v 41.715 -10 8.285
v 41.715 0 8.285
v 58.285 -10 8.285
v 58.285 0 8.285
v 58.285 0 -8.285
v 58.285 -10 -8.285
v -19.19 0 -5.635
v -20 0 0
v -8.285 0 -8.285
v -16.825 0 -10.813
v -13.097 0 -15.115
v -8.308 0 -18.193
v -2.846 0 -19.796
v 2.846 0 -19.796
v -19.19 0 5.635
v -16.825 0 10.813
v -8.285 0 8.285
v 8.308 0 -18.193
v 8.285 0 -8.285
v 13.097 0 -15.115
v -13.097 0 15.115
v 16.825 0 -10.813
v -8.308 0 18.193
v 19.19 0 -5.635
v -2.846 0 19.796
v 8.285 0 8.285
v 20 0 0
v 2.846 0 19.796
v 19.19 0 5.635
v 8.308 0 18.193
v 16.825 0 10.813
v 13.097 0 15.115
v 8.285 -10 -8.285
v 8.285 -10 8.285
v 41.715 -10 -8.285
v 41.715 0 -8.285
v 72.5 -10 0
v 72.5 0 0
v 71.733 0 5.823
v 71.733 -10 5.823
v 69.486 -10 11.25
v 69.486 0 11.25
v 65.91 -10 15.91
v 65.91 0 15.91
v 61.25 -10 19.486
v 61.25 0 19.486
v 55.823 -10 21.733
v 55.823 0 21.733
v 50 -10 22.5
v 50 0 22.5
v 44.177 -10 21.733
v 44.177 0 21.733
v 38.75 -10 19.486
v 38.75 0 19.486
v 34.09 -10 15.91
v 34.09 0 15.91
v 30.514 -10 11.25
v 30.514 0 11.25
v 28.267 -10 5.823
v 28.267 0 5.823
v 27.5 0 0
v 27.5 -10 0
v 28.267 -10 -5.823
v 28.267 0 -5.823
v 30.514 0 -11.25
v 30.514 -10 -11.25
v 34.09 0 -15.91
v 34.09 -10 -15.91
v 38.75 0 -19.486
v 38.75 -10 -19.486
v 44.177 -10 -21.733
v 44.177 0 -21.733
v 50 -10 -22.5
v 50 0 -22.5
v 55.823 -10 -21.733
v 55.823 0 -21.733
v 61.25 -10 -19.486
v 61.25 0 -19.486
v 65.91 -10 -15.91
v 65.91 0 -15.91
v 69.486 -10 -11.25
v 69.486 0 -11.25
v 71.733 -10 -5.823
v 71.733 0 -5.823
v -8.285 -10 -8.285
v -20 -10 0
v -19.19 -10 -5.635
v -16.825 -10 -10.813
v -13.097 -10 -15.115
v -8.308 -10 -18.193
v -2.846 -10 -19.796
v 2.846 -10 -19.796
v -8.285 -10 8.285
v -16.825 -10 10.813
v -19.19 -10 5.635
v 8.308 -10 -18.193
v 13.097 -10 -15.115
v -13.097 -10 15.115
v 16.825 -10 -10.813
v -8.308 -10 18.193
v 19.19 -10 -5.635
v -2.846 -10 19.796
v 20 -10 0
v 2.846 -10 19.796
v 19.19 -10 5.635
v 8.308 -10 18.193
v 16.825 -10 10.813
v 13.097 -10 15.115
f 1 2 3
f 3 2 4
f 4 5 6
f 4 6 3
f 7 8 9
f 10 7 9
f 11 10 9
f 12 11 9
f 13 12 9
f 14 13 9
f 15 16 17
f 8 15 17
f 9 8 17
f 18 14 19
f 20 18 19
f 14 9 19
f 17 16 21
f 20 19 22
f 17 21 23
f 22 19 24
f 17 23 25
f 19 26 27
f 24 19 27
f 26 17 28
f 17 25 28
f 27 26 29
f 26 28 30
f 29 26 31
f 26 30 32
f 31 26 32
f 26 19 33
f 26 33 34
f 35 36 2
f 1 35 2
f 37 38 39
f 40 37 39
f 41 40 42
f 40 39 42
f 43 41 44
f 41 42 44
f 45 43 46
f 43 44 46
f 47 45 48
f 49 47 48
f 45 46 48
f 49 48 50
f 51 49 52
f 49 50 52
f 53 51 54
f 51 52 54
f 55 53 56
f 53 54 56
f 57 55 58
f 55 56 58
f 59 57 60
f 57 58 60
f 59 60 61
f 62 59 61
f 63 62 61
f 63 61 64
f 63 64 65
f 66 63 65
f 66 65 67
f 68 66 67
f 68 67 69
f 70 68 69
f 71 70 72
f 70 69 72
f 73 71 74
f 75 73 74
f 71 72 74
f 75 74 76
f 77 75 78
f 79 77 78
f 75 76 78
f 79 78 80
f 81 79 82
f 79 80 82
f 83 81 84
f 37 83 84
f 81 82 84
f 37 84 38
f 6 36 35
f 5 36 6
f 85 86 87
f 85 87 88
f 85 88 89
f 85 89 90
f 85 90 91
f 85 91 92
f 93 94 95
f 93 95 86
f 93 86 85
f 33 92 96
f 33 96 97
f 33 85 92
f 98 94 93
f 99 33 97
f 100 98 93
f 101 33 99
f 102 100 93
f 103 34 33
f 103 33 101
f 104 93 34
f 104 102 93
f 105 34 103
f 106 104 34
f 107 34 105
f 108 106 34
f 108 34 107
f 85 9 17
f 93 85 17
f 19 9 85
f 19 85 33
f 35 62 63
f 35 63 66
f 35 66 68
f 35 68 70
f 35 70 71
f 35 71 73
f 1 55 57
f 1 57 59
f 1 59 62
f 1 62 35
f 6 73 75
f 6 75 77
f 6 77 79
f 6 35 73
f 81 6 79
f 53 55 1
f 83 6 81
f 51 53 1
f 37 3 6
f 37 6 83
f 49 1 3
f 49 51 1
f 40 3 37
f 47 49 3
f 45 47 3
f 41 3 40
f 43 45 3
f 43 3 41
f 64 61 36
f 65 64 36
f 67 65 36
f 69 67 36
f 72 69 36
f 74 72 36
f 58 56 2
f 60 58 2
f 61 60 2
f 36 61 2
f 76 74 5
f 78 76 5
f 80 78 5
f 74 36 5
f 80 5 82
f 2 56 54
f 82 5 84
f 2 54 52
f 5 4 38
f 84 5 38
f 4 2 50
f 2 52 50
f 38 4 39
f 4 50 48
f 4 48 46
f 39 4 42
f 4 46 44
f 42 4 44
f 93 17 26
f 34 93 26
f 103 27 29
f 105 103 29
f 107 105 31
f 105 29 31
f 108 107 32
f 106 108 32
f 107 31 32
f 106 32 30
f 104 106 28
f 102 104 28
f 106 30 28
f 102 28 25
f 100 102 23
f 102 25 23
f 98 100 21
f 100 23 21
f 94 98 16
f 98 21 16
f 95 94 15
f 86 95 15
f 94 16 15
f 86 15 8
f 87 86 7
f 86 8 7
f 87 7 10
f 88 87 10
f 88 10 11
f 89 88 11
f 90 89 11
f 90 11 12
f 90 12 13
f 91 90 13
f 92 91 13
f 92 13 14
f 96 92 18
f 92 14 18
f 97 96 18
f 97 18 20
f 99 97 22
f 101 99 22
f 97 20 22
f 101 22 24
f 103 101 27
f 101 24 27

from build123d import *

# Parameters (mm, degrees)
F0_R     = 20
F0_W     = 16.56957
F0_H     = 16.56957
F0_R_2   = 22.5
F1_DEPTH = 10


with BuildPart() as f1:
    # F0 (on Front) → F1 (new body)
    with BuildSketch(Plane.XZ):
        Circle(F0_R)
        Rectangle(F0_W, F0_H, mode=Mode.SUBTRACT)
        with Locations((50, 0)):
            Circle(F0_R_2)
        with Locations((50, 0)):
            Rectangle(F0_W, F0_H, mode=Mode.SUBTRACT)
    extrude(amount=F1_DEPTH)


solid = f1.part
